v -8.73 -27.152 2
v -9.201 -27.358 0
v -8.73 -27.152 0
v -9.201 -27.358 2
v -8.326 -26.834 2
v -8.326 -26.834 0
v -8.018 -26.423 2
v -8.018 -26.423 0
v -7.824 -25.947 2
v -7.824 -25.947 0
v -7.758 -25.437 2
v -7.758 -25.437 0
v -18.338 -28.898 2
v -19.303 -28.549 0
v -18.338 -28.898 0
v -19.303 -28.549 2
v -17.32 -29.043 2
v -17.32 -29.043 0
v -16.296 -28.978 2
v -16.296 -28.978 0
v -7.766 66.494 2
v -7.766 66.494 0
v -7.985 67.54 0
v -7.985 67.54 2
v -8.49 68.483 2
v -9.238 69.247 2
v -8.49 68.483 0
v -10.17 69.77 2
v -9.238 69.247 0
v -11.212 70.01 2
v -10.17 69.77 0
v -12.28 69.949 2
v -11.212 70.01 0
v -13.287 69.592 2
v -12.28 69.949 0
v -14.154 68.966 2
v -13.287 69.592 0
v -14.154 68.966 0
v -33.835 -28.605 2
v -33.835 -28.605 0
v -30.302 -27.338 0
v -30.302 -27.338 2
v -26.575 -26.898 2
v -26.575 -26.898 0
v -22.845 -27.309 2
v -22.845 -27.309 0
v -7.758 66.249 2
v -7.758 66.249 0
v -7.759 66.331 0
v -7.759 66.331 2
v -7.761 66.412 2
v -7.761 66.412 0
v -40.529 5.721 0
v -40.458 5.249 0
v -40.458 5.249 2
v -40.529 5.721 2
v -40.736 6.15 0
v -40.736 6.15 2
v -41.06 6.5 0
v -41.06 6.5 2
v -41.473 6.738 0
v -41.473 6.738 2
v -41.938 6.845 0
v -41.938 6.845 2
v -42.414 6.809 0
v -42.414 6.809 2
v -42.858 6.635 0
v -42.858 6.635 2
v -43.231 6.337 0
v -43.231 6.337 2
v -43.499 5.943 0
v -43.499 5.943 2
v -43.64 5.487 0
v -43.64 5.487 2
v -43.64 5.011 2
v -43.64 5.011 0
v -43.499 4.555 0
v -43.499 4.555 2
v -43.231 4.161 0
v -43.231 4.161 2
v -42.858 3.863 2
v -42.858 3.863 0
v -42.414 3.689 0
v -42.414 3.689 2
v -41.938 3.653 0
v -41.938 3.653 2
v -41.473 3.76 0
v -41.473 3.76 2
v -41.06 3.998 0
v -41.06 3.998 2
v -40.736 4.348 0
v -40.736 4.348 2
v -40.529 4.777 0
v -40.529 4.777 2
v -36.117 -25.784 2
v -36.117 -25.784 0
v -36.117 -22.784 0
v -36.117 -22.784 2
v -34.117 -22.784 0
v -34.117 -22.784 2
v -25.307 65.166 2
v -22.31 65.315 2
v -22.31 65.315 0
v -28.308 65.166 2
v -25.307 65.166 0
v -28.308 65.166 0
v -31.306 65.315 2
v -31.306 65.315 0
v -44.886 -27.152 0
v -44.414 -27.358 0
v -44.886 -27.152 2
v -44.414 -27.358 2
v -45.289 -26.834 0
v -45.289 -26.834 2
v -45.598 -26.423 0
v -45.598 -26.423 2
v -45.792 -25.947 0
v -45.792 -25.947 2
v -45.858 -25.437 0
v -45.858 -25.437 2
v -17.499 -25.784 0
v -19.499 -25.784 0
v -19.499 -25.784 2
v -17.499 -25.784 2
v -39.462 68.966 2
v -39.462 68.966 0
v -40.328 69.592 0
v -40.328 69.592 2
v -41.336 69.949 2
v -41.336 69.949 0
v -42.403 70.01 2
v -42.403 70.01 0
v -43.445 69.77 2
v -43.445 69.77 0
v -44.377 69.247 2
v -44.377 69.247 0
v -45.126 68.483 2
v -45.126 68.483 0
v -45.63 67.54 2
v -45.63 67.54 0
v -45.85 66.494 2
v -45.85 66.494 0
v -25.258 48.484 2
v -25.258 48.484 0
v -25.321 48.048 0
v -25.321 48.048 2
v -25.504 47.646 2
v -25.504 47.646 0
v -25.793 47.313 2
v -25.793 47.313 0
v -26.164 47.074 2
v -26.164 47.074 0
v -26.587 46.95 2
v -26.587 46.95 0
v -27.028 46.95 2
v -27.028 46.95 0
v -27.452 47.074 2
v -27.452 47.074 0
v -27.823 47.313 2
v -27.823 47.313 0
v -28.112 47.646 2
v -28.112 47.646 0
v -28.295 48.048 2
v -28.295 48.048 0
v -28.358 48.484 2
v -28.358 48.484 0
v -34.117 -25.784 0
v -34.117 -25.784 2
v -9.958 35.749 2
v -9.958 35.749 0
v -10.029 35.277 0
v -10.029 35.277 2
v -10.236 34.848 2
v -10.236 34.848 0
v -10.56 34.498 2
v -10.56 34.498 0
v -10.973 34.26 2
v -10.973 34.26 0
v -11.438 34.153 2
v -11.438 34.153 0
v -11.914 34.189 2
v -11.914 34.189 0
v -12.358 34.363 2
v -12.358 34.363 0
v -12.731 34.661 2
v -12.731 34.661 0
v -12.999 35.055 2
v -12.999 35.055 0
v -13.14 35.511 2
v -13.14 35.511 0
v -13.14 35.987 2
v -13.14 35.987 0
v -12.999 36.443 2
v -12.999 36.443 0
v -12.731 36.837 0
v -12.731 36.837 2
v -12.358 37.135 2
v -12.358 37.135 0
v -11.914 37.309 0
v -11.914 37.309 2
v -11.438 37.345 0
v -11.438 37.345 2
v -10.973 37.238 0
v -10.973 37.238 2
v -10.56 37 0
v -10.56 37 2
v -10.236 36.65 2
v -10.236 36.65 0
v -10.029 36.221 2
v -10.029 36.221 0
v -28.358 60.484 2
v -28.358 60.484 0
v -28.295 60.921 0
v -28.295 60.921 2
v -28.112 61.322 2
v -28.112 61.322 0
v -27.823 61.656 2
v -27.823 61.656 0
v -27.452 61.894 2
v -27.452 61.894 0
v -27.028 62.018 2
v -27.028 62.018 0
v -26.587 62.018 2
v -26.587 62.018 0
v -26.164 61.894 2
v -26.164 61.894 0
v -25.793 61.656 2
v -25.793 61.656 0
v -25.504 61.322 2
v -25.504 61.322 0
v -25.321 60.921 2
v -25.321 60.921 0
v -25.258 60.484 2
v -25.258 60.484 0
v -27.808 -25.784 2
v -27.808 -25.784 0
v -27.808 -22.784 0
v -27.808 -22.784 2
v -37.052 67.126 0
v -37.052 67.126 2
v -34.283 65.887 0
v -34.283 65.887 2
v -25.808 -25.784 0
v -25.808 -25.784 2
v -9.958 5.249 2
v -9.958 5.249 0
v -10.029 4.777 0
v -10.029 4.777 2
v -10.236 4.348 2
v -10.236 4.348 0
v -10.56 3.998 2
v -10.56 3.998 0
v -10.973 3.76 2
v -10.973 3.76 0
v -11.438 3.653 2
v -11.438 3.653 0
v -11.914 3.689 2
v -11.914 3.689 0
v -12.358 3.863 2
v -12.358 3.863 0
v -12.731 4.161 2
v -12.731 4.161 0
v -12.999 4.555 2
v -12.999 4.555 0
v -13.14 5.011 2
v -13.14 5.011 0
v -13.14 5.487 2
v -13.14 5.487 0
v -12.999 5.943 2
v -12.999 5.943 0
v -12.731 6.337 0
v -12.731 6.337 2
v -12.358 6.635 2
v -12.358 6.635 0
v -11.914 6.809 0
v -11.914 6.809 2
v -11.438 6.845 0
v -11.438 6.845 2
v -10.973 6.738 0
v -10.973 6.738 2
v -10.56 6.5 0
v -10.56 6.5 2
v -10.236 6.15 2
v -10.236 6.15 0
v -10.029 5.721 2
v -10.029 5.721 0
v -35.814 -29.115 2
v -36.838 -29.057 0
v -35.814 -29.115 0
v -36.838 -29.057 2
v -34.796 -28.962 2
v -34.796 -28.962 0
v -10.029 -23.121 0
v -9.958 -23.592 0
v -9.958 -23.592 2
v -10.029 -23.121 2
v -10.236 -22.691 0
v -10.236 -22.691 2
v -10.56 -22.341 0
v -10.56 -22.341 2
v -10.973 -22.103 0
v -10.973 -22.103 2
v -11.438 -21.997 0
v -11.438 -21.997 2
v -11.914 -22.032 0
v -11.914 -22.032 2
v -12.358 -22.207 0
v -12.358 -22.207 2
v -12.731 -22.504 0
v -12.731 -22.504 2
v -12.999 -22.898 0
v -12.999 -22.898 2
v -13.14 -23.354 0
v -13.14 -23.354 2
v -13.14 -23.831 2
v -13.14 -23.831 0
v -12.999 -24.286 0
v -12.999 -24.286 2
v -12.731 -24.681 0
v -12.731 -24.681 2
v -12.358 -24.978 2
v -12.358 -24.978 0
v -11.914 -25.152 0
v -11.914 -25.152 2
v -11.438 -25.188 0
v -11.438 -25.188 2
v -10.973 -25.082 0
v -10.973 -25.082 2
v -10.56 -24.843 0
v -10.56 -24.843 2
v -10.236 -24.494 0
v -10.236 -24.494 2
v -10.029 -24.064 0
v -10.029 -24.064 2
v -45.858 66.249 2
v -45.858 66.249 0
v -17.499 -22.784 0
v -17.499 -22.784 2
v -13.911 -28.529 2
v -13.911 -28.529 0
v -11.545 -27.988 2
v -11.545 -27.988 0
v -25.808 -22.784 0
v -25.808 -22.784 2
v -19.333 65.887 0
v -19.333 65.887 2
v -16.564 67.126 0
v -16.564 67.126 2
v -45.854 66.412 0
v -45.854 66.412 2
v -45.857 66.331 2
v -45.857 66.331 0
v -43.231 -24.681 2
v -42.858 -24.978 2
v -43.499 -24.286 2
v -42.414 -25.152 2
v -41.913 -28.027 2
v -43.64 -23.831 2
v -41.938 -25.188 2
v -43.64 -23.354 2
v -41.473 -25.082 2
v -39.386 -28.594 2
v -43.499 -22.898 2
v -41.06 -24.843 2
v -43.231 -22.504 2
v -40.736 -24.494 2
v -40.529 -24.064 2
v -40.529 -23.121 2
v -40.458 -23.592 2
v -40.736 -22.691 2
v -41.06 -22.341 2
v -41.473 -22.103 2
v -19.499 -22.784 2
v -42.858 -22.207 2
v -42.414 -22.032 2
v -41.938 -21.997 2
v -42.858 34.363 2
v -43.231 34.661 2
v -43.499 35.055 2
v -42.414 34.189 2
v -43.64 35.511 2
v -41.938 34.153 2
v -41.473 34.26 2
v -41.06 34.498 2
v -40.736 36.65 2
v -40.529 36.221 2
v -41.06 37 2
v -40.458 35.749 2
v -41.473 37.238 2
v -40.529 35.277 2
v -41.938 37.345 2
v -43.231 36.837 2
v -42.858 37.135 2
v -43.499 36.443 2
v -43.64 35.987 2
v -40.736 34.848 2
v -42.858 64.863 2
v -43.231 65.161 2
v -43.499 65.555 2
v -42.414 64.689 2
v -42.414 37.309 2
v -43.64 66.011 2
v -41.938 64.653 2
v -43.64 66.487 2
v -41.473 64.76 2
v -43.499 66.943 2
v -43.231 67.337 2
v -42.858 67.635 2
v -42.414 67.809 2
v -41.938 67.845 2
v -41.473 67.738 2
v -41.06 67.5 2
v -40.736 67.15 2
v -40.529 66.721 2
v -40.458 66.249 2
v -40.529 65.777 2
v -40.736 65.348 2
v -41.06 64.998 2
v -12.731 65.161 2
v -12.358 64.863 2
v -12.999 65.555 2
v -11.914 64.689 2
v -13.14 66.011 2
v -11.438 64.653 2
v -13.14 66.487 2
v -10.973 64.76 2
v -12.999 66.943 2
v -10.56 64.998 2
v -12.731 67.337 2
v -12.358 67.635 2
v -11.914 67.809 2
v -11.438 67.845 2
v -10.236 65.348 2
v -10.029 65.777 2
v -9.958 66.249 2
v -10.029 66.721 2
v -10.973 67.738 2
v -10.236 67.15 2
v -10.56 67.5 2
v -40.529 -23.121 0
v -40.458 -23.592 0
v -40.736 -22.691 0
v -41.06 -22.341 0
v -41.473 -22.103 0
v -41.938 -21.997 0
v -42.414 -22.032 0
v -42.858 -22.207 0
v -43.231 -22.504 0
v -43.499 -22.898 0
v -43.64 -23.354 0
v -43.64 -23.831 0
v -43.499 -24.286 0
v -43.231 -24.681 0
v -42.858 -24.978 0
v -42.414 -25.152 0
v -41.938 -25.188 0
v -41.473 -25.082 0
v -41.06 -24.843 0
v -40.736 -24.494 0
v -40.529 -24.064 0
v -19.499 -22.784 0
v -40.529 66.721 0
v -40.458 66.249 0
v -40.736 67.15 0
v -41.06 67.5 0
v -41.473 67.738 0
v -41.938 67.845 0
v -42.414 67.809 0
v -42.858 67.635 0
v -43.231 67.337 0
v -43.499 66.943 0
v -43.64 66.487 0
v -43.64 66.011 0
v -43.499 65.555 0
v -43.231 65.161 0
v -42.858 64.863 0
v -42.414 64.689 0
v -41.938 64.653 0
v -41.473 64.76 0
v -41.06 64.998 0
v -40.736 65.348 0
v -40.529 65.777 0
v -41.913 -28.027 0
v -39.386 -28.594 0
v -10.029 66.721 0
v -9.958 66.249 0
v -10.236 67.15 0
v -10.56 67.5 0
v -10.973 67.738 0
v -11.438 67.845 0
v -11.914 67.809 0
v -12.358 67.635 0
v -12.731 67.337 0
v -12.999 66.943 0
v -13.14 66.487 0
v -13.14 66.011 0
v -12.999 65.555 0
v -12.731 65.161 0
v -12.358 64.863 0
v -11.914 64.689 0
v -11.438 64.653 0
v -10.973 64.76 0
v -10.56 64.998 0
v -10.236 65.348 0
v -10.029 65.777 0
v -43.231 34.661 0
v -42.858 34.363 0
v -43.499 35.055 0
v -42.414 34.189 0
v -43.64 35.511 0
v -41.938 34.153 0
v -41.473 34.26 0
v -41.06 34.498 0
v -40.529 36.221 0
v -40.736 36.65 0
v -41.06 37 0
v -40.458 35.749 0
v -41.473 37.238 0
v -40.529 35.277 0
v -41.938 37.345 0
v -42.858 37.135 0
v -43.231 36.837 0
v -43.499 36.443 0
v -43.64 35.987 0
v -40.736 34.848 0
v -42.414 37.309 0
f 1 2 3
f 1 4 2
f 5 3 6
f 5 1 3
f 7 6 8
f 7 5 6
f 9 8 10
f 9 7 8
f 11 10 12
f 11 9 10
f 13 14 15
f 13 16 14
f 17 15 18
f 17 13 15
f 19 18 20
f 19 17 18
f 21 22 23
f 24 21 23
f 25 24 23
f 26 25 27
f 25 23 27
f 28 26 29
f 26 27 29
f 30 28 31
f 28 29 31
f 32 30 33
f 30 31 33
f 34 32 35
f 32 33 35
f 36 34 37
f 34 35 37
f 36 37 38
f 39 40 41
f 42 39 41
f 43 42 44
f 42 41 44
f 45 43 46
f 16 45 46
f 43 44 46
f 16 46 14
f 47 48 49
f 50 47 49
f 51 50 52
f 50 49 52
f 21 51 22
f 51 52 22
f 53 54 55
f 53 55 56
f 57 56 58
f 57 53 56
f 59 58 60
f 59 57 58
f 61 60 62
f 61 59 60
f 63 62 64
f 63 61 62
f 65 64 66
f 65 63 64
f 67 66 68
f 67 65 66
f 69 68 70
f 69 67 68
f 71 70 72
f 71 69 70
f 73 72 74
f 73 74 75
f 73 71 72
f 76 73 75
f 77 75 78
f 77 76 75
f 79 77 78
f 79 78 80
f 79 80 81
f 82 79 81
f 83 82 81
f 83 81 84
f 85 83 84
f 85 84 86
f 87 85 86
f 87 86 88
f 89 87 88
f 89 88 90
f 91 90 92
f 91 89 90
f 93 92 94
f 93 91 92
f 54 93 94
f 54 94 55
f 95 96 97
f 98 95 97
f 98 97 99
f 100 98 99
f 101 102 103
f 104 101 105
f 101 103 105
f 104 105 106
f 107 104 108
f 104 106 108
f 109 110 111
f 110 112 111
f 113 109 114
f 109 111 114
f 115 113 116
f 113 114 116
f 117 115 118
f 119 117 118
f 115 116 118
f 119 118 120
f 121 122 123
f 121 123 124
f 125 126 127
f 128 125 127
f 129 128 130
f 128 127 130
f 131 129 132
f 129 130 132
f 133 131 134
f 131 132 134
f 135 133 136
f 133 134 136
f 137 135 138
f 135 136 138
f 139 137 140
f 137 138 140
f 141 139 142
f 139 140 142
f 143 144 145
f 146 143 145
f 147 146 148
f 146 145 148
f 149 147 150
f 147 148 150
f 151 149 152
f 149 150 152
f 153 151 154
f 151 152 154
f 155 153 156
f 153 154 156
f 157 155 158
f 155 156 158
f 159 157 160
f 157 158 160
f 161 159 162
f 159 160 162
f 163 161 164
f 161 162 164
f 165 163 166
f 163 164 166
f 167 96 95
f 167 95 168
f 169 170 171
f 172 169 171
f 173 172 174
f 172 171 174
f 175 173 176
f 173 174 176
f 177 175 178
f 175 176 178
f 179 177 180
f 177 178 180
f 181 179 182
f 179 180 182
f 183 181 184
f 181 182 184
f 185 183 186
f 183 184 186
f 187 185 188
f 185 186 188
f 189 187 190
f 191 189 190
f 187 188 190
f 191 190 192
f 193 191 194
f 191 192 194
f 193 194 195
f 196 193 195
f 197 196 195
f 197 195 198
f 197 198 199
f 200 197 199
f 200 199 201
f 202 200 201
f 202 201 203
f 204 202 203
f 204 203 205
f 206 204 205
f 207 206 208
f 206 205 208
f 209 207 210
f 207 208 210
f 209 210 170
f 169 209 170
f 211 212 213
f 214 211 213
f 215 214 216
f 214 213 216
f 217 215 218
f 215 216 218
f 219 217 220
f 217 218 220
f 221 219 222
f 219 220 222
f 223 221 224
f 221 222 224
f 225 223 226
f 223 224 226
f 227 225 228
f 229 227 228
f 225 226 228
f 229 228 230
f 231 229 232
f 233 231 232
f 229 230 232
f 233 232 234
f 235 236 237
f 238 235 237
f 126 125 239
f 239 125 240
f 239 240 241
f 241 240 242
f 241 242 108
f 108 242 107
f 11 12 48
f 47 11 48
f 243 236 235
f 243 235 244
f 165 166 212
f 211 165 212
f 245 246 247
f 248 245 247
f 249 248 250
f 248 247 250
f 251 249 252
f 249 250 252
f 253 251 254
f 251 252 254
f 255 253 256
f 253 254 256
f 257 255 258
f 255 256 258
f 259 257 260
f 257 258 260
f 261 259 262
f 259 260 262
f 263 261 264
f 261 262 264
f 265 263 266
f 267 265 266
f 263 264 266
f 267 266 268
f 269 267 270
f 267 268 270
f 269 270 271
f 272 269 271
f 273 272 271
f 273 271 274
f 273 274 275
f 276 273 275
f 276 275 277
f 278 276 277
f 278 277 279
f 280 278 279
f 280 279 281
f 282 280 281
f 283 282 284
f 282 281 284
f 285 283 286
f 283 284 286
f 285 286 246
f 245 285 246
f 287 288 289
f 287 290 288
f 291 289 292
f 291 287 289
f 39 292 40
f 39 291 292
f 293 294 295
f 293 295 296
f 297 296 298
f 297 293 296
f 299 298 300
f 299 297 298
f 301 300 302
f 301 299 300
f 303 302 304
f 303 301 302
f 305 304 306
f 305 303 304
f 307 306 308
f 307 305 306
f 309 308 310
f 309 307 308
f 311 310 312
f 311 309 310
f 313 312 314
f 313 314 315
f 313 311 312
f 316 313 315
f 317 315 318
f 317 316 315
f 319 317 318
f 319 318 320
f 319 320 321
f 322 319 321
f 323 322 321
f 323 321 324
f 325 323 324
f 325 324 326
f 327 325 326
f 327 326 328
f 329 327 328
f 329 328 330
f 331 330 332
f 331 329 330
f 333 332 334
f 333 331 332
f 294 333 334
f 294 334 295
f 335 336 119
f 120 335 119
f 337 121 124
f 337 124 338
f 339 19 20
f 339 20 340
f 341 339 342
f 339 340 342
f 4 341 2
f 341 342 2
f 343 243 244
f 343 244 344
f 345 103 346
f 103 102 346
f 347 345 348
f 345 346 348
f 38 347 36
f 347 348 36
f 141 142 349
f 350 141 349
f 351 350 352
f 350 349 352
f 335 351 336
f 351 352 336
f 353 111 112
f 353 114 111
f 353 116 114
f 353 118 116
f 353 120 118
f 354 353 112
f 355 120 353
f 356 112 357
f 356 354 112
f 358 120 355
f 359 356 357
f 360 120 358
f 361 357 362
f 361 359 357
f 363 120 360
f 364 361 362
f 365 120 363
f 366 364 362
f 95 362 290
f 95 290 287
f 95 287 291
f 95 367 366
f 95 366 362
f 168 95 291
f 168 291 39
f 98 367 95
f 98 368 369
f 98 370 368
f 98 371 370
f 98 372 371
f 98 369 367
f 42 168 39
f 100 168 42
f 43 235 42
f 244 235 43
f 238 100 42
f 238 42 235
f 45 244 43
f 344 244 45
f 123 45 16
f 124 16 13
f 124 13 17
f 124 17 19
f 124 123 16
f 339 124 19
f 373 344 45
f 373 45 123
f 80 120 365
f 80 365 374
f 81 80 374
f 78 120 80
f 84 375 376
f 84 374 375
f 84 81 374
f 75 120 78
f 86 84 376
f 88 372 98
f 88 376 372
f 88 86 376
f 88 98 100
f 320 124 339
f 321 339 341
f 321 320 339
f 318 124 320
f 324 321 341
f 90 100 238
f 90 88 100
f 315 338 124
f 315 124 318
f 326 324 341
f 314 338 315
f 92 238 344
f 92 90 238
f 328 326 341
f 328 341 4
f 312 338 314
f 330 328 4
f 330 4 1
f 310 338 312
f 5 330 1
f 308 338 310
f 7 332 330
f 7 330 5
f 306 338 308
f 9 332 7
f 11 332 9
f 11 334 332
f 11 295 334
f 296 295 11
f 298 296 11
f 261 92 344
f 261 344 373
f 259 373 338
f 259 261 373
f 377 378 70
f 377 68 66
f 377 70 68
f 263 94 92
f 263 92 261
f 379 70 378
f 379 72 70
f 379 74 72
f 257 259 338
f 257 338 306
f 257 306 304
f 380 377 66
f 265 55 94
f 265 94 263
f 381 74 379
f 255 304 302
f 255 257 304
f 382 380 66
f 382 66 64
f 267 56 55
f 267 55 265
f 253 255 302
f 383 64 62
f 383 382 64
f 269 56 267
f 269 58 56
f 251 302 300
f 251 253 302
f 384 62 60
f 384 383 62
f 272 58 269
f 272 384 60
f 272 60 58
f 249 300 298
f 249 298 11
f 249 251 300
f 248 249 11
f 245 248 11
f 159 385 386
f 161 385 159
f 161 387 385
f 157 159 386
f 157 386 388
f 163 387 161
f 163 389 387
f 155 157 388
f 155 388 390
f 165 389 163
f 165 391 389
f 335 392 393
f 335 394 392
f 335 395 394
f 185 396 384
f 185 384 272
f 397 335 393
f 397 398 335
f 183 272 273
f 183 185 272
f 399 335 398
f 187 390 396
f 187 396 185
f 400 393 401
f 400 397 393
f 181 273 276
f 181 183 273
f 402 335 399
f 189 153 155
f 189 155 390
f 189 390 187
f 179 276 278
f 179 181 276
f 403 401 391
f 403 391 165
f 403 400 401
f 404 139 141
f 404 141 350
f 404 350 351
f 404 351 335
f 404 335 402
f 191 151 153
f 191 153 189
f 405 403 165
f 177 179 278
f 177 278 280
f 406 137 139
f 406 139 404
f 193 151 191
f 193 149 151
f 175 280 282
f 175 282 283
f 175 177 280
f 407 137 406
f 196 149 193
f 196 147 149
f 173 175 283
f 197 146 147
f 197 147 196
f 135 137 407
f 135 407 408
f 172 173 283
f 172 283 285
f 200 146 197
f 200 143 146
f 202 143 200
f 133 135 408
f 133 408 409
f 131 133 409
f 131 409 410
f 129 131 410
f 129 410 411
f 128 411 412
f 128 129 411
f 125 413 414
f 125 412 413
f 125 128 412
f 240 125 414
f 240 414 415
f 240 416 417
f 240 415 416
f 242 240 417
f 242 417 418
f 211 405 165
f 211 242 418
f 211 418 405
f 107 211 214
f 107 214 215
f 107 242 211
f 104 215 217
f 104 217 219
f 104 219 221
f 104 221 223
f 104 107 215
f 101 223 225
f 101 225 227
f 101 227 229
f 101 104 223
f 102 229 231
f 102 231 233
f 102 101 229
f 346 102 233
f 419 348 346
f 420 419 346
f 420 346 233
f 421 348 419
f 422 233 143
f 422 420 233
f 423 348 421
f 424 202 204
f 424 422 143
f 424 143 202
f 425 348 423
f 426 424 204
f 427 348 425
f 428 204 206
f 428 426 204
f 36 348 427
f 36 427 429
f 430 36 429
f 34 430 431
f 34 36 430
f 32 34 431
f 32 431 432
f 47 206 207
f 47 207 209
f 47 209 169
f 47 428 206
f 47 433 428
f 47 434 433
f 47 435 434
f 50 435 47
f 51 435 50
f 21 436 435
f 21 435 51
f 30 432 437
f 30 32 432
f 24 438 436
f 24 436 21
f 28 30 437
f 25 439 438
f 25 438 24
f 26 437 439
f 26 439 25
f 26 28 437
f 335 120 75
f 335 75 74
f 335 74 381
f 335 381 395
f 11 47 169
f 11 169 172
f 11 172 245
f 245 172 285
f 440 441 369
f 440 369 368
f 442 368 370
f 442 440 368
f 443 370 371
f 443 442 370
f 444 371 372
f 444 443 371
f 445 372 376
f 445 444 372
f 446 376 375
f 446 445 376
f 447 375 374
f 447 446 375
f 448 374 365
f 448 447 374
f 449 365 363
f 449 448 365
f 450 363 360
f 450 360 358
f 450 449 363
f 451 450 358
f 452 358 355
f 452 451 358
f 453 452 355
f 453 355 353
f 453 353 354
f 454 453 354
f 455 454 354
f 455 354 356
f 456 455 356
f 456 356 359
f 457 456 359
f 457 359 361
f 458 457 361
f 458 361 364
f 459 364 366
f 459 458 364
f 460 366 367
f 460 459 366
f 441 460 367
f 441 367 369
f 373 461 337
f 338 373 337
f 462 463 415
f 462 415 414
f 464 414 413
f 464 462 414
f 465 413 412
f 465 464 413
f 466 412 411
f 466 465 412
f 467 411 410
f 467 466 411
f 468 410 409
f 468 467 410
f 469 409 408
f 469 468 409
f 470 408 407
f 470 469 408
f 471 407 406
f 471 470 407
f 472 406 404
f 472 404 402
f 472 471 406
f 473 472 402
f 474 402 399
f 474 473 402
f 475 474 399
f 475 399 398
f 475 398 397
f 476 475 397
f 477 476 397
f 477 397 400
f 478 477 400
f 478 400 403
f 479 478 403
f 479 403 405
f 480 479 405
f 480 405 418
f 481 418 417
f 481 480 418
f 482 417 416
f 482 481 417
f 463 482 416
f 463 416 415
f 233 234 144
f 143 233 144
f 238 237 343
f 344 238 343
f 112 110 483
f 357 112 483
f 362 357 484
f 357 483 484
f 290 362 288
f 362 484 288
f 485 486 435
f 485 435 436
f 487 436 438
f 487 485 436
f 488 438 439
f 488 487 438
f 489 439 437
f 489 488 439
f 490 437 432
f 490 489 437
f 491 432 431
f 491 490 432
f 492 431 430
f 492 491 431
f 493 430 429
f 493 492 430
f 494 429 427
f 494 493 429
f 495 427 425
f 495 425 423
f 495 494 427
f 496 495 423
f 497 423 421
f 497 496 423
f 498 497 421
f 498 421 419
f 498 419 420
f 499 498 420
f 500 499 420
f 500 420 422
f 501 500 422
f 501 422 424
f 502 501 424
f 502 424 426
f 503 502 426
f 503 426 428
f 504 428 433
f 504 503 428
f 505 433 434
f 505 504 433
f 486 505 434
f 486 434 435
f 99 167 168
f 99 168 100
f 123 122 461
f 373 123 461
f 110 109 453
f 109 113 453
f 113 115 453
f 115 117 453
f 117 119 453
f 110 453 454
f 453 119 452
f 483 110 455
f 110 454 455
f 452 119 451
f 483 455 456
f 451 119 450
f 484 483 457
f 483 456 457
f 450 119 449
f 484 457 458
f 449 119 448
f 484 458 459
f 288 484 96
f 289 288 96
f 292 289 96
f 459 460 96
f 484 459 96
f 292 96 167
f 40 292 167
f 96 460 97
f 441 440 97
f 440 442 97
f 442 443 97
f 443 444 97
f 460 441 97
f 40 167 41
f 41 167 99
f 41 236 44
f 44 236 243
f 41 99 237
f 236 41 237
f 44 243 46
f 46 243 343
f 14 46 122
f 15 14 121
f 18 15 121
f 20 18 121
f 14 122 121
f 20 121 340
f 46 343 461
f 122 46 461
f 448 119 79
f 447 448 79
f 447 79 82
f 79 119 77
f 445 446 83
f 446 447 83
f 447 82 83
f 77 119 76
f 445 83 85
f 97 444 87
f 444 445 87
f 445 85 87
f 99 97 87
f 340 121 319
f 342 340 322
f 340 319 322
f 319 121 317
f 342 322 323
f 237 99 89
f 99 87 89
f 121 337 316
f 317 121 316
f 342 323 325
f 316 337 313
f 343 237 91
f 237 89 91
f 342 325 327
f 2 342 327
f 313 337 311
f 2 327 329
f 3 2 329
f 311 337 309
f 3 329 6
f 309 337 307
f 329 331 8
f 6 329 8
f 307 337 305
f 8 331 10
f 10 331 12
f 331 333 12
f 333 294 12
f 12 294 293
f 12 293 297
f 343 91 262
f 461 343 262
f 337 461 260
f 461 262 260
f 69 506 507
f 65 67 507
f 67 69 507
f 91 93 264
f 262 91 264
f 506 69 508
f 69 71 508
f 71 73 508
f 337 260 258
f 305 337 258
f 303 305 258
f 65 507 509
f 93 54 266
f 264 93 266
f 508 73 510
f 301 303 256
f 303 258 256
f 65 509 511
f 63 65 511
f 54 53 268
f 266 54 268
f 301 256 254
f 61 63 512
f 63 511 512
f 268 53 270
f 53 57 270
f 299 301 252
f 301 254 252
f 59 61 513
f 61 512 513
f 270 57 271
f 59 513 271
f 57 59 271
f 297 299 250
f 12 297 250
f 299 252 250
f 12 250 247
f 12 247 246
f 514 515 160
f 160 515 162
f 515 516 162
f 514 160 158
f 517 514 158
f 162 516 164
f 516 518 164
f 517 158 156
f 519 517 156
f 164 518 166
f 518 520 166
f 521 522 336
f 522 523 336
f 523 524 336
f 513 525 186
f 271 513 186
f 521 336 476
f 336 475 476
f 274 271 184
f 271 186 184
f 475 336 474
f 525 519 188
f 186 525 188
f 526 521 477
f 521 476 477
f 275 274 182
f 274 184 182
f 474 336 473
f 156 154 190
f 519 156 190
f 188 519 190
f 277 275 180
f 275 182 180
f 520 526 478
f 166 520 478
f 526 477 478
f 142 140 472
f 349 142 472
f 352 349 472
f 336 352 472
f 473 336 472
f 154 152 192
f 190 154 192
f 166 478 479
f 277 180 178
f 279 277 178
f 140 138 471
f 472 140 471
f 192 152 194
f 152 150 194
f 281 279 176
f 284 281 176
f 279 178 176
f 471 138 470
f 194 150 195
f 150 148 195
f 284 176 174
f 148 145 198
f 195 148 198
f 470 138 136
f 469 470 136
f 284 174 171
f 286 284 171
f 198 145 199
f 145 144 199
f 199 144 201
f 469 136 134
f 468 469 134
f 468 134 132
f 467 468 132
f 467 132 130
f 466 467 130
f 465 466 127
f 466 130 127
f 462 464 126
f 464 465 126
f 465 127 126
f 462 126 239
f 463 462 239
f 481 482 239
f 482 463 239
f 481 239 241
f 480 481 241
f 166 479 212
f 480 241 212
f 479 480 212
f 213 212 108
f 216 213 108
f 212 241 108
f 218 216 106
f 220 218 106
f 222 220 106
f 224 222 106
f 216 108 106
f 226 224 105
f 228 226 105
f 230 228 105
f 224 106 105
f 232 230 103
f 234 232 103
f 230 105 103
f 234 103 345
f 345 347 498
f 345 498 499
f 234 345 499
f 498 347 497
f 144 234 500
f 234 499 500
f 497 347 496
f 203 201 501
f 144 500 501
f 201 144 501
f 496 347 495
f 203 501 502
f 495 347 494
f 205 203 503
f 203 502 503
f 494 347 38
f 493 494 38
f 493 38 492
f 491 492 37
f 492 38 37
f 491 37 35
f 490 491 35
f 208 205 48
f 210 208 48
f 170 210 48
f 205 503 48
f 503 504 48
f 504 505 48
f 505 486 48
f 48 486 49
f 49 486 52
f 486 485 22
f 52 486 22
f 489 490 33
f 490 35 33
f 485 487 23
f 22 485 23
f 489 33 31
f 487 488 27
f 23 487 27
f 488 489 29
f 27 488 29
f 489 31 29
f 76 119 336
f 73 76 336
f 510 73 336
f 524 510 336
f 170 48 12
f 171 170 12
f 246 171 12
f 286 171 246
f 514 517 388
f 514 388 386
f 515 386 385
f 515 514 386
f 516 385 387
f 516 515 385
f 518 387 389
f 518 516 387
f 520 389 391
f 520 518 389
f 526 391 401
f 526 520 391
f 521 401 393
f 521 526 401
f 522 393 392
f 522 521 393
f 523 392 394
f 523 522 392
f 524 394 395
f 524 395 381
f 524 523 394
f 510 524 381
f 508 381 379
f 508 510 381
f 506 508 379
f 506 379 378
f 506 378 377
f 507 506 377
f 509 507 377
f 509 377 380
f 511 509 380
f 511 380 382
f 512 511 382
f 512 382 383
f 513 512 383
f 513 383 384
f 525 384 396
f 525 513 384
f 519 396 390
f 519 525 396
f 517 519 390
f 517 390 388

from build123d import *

# Parameters (mm, degrees)
F0_R     = 1.6
F0_W     = 2
F0_H     = 3
F1_DEPTH = 2
F2_R     = 5
F3_R     = 2
F4_R     = 13.153232


with BuildPart() as f1:
    # F0 (on Top) → F1 (new body)
    with BuildSketch(Plane.XY):
        with Locations((-42.057751, 35.748998)):
            Circle(F0_R)
        with BuildLine():
            ThreePointArc((-13.157751, 35.748998), (-11.557751, 34.148998), (-9.957751, 35.748998))
            ThreePointArc((-9.957751, 35.748998), (-11.557751, 37.348998), (-13.157751, 35.748998))
        make_face()
        with Locations((-42.057751, 5.248998)):
            Circle(F0_R)
        with BuildLine():
            ThreePointArc((-13.157751, 5.248998), (-11.557751, 3.648998), (-9.957751, 5.248998))
            ThreePointArc((-9.957751, 5.248998), (-11.557751, 6.848998), (-13.157751, 5.248998))
        make_face()
        with BuildLine():
            ThreePointArc((-45.849798, 66.493904), (-45.855762, 66.371516), (-45.857751, 66.248998))
            Line((-45.857751, 66.248998), (-45.857751, 60.434222))
            Line((-45.857751, 60.434222), (-45.857751, 35.748998))
            Line((-45.857751, 35.748998), (-45.857751, 33.160256))
            Line((-45.857751, 33.160256), (-45.857751, 5.248998))
            Line((-45.857751, 5.248998), (-45.857751, -19.436226))
            Line((-45.857751, -19.436226), (-45.857751, -25.251002))
            Line((-45.857751, -25.251002), (-45.857751, -26.920806))
            ThreePointArc((-45.857751, -26.920806), (-40.539361, -28.348832), (-35.116938, -29.308968))
            ThreePointArc((-35.116938, -29.308968), (-26.575174, -26.898307), (-18.01507, -29.243015))
            ThreePointArc((-18.01507, -29.243015), (-12.838073, -28.295417), (-7.757751, -26.920806))
            Line((-7.757751, -26.920806), (-7.757751, -25.251002))
            Line((-7.757751, -25.251002), (-7.757751, -19.436226))
            Line((-7.757751, -19.436226), (-7.757751, 5.248998))
            Line((-7.757751, 5.248998), (-7.757751, 35.748998))
            Line((-7.757751, 35.748998), (-7.757751, 60.434222))
            Line((-7.757751, 60.434222), (-7.757751, 66.248998))
            ThreePointArc((-7.757751, 66.248998), (-7.759739, 66.371516), (-7.765703, 66.493904))
            ThreePointArc((-7.765703, 66.493904), (-11.655268, 70.022009), (-15.307751, 66.248998))
            ThreePointArc((-15.307751, 66.248998), (-26.807751, 65.147515), (-38.307751, 66.248998))
            ThreePointArc((-38.307751, 66.248998), (-41.960233, 70.022009), (-45.849798, 66.493904))
        make_face()
        with Locations((-42.057751, -23.592251)):
            Circle(F0_R, mode=Mode.SUBTRACT)
        with Locations((-35.116938, -24.283788)):
            Rectangle(F0_W, F0_H, mode=Mode.SUBTRACT)
        with Locations((-26.807751, -24.283788)):
            Rectangle(F0_W, F0_H, mode=Mode.SUBTRACT)
        with Locations((-42.057751, 5.248998)):
            Circle(F0_R, mode=Mode.SUBTRACT)
        with Locations((-18.498563, -24.283788)):
            Rectangle(F0_W, F0_H, mode=Mode.SUBTRACT)
        with Locations((-11.557751, -23.592251)):
            Circle(F0_R, mode=Mode.SUBTRACT)
        with BuildLine():
            ThreePointArc((-13.157751, 5.248998), (-11.557751, 6.848998), (-9.957751, 5.248998))
            ThreePointArc((-9.957751, 5.248998), (-11.557751, 3.648998), (-13.157751, 5.248998))
        make_face(mode=Mode.SUBTRACT)
        with Locations((-42.057751, 35.748998)):
            Circle(F0_R, mode=Mode.SUBTRACT)
        with Locations((-42.057751, 66.248998)):
            Circle(F0_R, mode=Mode.SUBTRACT)
        with BuildLine():
            ThreePointArc((-13.157751, 35.748998), (-11.557751, 37.348998), (-9.957751, 35.748998))
            ThreePointArc((-9.957751, 35.748998), (-11.557751, 34.148998), (-13.157751, 35.748998))
        make_face(mode=Mode.SUBTRACT)
        with BuildLine():
            ThreePointArc((-28.357751, 60.4842), (-26.807751, 62.0342), (-25.257751, 60.4842))
            Line((-25.257751, 60.4842), (-25.257751, 48.4842))
            ThreePointArc((-25.257751, 48.4842), (-26.807751, 46.9342), (-28.357751, 48.4842))
            Line((-28.357751, 48.4842), (-28.357751, 60.4842))
        make_face(mode=Mode.SUBTRACT)
        with Locations((-11.557751, 66.248998)):
            Circle(F0_R, mode=Mode.SUBTRACT)
    extrude(amount=F1_DEPTH)

    # F2
    f2_edges = [f1.edges().sort_by_distance(p)[0] for p in [
        (-35.116938, -29.308968, 1),
        (-18.01507, -29.243015, 1),
    ]]
    fillet(f2_edges, radius=F2_R)

    # F3
    f3_edges = [f1.edges().sort_by_distance(p)[0] for p in [
        (-7.757751, -26.920806, 1),
        (-45.857751, -26.920806, 1),
    ]]
    fillet(f3_edges, radius=F3_R)

    # F4
    f4_edges = [f1.edges().sort_by_distance(p)[0] for p in [
        (-38.307751, 66.248998, 1),
        (-15.307751, 66.248998, 1),
    ]]
    fillet(f4_edges, radius=F4_R)


solid = f1.part
